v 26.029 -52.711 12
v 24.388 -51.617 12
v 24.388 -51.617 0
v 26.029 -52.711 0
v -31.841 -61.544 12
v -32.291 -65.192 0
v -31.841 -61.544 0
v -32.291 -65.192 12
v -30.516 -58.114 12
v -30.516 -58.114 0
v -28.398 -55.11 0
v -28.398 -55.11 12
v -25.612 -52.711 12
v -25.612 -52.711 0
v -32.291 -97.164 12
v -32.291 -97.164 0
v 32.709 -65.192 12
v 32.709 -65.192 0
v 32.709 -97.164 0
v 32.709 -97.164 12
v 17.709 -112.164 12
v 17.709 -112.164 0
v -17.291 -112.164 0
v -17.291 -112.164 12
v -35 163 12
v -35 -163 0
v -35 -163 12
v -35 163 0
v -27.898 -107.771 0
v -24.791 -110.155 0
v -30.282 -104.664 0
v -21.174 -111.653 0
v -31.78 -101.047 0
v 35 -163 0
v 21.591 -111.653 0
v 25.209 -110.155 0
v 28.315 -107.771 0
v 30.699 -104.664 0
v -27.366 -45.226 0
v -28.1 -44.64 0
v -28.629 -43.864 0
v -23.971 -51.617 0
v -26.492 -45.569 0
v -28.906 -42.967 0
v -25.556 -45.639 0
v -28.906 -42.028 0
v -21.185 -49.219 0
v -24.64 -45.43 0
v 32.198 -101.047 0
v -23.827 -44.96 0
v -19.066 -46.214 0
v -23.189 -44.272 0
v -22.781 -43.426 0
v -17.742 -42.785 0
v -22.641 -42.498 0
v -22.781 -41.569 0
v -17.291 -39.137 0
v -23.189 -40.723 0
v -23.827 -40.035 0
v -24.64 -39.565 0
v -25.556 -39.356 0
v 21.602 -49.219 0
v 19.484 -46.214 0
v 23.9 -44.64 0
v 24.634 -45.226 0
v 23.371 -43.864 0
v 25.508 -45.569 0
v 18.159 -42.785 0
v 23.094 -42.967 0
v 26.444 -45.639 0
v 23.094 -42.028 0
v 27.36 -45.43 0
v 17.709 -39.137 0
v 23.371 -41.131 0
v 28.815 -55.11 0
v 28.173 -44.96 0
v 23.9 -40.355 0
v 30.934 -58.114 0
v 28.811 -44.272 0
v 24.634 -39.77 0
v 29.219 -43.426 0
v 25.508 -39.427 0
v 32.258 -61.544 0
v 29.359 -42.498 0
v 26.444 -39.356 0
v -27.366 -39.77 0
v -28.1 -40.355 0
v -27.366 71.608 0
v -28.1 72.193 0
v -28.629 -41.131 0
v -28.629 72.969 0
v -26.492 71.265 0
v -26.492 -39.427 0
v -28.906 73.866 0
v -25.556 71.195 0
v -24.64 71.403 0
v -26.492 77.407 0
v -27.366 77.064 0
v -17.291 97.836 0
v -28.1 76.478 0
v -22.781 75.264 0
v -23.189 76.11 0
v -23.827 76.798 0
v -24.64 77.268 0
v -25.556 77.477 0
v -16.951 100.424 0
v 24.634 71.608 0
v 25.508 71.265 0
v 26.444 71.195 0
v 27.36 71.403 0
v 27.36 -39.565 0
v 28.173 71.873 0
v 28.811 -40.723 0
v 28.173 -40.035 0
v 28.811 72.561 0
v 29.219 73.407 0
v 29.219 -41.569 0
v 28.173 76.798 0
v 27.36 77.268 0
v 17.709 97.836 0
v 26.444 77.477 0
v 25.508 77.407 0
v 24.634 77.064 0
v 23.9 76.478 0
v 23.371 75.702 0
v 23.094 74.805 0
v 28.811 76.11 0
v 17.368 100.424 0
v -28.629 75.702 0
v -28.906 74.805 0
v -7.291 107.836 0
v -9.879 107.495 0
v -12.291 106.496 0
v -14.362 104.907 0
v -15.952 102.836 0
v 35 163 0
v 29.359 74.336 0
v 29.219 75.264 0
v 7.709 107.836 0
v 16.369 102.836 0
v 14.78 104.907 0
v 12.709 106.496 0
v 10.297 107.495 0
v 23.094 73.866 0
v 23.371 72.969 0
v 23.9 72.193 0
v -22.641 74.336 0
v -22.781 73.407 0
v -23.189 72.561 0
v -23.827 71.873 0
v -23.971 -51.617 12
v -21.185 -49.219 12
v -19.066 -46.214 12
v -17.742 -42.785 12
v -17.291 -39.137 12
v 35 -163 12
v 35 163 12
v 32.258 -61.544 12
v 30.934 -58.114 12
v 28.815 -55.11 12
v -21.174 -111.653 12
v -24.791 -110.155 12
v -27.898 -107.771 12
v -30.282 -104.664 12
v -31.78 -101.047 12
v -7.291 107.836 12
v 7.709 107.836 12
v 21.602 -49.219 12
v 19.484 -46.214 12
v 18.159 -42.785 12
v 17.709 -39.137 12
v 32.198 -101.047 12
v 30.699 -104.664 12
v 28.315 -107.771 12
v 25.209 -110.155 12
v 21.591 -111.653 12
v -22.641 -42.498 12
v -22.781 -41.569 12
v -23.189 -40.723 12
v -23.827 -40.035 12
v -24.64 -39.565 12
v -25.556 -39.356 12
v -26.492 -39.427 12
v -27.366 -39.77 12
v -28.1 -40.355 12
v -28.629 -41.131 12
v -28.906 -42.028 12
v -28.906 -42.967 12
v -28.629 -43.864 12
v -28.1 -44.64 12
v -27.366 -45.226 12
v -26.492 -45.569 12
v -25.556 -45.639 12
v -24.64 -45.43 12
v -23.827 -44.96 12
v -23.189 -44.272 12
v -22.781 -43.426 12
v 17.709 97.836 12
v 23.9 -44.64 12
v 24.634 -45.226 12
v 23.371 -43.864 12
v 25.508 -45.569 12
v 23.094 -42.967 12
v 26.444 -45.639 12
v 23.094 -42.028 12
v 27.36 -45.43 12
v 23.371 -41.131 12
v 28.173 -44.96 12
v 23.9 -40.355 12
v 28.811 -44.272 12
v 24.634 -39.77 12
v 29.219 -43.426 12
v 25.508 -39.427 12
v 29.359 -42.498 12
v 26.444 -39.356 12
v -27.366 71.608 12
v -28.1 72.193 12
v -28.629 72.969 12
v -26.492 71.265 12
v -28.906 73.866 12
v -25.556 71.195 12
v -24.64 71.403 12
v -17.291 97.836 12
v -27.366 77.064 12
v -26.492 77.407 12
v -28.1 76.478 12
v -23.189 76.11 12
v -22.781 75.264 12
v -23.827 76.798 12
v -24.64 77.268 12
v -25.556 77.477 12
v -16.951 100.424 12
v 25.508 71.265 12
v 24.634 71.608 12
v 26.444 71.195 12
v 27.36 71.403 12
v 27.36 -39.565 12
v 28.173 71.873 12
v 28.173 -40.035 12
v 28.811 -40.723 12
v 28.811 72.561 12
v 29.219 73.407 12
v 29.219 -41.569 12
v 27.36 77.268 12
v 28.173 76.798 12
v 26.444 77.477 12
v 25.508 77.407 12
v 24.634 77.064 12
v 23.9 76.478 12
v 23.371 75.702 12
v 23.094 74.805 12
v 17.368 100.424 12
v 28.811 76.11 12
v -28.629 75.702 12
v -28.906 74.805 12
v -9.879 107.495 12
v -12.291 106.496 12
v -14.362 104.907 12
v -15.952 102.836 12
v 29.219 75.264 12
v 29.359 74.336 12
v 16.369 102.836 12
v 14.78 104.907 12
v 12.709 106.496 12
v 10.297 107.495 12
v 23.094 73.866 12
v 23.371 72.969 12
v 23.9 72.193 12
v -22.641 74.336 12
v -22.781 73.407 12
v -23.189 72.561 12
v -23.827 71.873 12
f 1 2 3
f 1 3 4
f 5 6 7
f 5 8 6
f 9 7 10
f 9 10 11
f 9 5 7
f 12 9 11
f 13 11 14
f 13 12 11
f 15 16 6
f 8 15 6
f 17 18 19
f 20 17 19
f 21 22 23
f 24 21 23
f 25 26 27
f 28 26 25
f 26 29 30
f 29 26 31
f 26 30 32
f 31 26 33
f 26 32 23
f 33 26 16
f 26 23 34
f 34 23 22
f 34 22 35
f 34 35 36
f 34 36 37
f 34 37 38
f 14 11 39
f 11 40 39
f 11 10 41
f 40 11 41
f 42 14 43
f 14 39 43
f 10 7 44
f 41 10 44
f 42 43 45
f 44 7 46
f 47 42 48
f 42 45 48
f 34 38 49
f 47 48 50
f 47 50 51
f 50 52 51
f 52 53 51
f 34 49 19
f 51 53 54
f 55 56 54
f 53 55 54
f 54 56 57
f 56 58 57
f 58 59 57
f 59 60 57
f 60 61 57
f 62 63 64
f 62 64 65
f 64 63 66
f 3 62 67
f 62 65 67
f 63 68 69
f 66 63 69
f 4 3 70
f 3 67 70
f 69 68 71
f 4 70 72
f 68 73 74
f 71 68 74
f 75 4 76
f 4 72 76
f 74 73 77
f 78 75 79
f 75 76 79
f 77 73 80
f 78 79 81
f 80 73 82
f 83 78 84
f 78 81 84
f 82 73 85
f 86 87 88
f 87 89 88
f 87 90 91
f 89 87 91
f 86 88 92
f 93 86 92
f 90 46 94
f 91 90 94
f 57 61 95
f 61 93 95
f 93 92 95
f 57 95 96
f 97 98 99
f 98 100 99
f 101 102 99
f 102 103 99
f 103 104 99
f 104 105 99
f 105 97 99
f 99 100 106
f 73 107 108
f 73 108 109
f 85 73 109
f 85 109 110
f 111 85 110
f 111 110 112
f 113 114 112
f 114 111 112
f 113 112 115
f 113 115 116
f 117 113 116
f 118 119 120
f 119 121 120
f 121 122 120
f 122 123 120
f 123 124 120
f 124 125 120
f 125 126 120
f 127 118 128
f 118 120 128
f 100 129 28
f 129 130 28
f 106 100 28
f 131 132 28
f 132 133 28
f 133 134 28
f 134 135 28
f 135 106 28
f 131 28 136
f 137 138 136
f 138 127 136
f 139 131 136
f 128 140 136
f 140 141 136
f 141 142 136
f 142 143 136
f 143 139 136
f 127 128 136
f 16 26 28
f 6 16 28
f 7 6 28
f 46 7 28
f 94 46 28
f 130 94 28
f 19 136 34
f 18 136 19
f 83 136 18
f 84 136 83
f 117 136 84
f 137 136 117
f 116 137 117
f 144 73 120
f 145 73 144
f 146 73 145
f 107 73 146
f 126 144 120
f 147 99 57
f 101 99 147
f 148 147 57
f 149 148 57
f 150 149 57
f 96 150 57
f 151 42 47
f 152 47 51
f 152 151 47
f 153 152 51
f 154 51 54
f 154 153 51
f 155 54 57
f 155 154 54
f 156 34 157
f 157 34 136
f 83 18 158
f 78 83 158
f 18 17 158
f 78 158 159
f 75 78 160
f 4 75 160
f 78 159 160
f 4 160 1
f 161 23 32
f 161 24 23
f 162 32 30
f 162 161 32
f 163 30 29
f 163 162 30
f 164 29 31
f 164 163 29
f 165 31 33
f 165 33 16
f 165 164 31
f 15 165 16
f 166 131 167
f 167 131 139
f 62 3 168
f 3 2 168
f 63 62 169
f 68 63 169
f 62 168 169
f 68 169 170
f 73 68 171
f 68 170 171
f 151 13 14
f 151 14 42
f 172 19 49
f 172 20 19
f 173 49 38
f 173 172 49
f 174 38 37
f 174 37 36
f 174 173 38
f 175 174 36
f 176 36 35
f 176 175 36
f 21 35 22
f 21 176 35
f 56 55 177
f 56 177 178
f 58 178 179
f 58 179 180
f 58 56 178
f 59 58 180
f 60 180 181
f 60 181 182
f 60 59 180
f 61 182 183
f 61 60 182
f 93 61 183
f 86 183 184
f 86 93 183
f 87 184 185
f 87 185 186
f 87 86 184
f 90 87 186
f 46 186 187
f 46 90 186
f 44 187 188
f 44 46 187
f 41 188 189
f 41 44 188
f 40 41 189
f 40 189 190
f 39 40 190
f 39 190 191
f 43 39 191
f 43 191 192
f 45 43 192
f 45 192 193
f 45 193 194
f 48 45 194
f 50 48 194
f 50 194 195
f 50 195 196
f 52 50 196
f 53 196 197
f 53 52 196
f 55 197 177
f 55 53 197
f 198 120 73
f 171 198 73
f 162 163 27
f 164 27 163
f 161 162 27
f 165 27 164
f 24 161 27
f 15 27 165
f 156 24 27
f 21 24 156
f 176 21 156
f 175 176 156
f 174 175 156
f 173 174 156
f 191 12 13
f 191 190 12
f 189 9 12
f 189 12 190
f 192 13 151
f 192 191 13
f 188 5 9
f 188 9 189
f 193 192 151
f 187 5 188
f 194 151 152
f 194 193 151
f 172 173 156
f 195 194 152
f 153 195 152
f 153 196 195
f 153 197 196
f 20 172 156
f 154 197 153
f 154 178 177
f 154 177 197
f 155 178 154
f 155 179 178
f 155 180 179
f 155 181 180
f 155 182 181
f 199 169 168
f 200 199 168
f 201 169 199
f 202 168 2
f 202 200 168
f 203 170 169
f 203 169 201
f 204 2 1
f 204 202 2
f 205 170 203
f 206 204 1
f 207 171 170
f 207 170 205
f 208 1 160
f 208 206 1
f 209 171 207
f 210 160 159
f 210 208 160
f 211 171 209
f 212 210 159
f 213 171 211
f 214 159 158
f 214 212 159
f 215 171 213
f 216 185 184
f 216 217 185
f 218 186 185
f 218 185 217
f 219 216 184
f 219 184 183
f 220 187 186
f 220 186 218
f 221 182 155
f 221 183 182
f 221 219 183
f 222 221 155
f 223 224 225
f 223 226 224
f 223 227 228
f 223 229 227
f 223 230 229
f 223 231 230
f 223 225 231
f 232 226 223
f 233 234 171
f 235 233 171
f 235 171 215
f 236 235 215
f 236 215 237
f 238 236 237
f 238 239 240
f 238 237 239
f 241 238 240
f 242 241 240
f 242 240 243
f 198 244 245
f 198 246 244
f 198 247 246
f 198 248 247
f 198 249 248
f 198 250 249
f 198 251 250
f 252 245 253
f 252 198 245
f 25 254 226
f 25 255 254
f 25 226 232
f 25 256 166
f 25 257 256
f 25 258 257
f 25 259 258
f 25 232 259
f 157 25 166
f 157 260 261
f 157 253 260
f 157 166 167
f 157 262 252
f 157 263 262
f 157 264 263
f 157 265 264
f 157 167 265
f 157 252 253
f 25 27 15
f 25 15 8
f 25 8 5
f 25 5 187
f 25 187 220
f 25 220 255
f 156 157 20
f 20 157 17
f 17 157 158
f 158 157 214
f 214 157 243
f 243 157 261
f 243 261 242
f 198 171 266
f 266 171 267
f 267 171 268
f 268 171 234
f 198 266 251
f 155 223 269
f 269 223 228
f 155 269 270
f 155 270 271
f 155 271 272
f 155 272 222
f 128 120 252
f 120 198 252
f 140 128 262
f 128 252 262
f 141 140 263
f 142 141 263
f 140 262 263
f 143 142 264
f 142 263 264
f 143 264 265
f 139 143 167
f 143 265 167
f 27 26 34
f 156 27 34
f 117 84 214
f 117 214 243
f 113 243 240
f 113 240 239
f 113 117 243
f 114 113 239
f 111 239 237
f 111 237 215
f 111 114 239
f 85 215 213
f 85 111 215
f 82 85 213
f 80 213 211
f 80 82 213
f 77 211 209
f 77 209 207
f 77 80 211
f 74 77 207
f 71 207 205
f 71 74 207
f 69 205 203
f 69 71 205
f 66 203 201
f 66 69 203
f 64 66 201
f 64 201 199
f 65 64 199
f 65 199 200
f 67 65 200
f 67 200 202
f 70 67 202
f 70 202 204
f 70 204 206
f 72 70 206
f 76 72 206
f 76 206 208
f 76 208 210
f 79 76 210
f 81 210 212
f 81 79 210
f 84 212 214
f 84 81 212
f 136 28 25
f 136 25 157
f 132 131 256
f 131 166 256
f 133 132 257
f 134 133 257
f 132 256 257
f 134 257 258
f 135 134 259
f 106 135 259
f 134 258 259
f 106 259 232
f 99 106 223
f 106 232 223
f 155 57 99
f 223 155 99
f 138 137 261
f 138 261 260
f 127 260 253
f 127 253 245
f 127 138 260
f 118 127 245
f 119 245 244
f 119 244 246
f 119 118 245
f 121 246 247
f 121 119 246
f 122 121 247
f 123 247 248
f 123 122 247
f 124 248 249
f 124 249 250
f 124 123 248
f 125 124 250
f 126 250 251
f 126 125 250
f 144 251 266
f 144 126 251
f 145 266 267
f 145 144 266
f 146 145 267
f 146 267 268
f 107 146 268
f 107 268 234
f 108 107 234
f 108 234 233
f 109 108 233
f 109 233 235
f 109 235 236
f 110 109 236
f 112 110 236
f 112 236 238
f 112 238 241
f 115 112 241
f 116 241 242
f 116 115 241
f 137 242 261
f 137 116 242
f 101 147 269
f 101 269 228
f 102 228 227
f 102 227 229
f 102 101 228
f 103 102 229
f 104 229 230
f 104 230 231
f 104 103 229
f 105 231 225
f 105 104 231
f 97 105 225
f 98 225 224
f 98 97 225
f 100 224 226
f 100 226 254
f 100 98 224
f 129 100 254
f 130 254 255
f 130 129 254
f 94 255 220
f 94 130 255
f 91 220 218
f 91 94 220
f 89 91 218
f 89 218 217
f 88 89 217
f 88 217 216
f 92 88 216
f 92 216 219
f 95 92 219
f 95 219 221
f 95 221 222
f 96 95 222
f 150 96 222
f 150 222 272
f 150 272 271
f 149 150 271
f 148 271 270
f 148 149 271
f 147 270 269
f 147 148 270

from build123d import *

# Parameters (mm, degrees)
F0_W     = 70
F0_H     = 326
F0_W_2   = 17
F0_H_2   = 17
F0_R     = 3.15
F1_DEPTH = 12
F2_R     = 15
F3_R     = 10


with BuildPart() as f1:
    # F0 (on Top) → F1 (new body)
    with BuildSketch(Plane.XY):
        Rectangle(F0_W, F0_H)
        Polygon((32.7086956522, -112.1642902674), (17.7086956522, -112.1642902674), (-17.2913043478, -112.1642902674), (-32.2913043478, -112.1642902674), (-32.2913043478, -57.1642902674), (-34.2913043478, -47.1642902674), (-34.2913043478, -32.1642902674), (-17.2913043478, -32.1642902674), (-17.2913043478, 65.8357097326), (-34.2913043478, 65.8357097326), (-34.2913043478, 82.8357097326), (-17.2913043478, 82.8357097326), (-17.2913043478, 107.8357097326), (17.7086956522, 107.8357097326), (17.7086956522, 82.8357097326), (34.7086956522, 82.8357097326), (34.7086956522, 65.8357097326), (17.7086956522, 65.8357097326), (17.7086956522, -32.1642902674), (34.7086956522, -32.1642902674), (34.7086956522, -47.1642902674), (32.7086956522, -57.1642902674), align=None, mode=Mode.SUBTRACT)
        Polygon((-34.2913043478, -47.1642902674), (-32.2913043478, -57.1642902674), (-17.2913043478, -47.1642902674), (-17.2913043478, -32.1642902674), (-34.2913043478, -32.1642902674), align=None)
        Polygon((-25.7913043478, -36.608650855), (-20.6913043478, -39.5531372279), (-20.6913043478, -45.4421099736), (-25.7913043478, -48.3865963465), (-30.8913043478, -45.4421099736), (-30.8913043478, -39.5531372279), align=None, mode=Mode.SUBTRACT)
        Polygon((17.7086956522, -47.1642902674), (32.7086956522, -57.1642902674), (34.7086956522, -47.1642902674), (34.7086956522, -32.1642902674), (17.7086956522, -32.1642902674), align=None)
        Polygon((31.3086956522, -45.4421099736), (26.2086956522, -48.3865963465), (21.1086956522, -45.4421099736), (21.1086956522, -39.5531372279), (26.2086956522, -36.608650855), (31.3086956522, -39.5531372279), align=None, mode=Mode.SUBTRACT)
        with Locations((-25.7913043478, 74.3357097326)):
            Rectangle(F0_W_2, F0_H_2)
        Polygon((-20.6913043478, 77.2801961054), (-20.6913043478, 71.3912233597), (-25.7913043478, 68.4467369868), (-30.8913043478, 71.3912233597), (-30.8913043478, 77.2801961054), (-25.7913043478, 80.2246824783), align=None, mode=Mode.SUBTRACT)
        with Locations((26.2086956522, 74.3357097326)):
            Rectangle(F0_W_2, F0_H_2)
        Polygon((31.3086956522, 71.3912233597), (26.2086956522, 68.4467369868), (21.1086956522, 71.3912233597), (21.1086956522, 77.2801961054), (26.2086956522, 80.2246824783), (31.3086956522, 77.2801961054), align=None, mode=Mode.SUBTRACT)
        Polygon((-20.6913043478, -45.4421099736), (-20.6913043478, -39.5531372279), (-25.7913043478, -36.608650855), (-30.8913043478, -39.5531372279), (-30.8913043478, -45.4421099736), (-25.7913043478, -48.3865963465), align=None)
        with Locations((-25.7913043478, -42.4976236008)):
            Circle(F0_R, mode=Mode.SUBTRACT)
        Polygon((21.1086956522, -45.4421099736), (26.2086956522, -48.3865963465), (31.3086956522, -45.4421099736), (31.3086956522, -39.5531372279), (26.2086956522, -36.608650855), (21.1086956522, -39.5531372279), align=None)
        with Locations((26.2086956522, -42.4976236008)):
            Circle(F0_R, mode=Mode.SUBTRACT)
        Polygon((-25.7913043478, 68.4467369868), (-20.6913043478, 71.3912233597), (-20.6913043478, 77.2801961054), (-25.7913043478, 80.2246824783), (-30.8913043478, 77.2801961054), (-30.8913043478, 71.3912233597), align=None)
        with Locations((-25.7913043478, 74.3357097326)):
            Circle(F0_R, mode=Mode.SUBTRACT)
        Polygon((21.1086956522, 71.3912233597), (26.2086956522, 68.4467369868), (31.3086956522, 71.3912233597), (31.3086956522, 77.2801961054), (26.2086956522, 80.2246824783), (21.1086956522, 77.2801961054), align=None)
        with Locations((26.2086956522, 74.3357097326)):
            Circle(F0_R, mode=Mode.SUBTRACT)
    extrude(amount=F1_DEPTH)

    # F2
    f2_edges = [f1.edges().sort_by_distance(p)[0] for p in [
        (-32.291304, -57.16429, 6),
        (-17.291304, -47.16429, 6),
        (17.708696, -47.16429, 6),
        (32.708696, -57.16429, 6),
        (32.708696, -112.16429, 6),
        (-32.291304, -112.16429, 6),
    ]]
    fillet(f2_edges, radius=F2_R)

    # F3
    f3_edges = [f1.edges().sort_by_distance(p)[0] for p in [
        (17.708696, 107.83571, 6),
        (-17.291304, 107.83571, 6),
    ]]
    fillet(f3_edges, radius=F3_R)


solid = f1.part
